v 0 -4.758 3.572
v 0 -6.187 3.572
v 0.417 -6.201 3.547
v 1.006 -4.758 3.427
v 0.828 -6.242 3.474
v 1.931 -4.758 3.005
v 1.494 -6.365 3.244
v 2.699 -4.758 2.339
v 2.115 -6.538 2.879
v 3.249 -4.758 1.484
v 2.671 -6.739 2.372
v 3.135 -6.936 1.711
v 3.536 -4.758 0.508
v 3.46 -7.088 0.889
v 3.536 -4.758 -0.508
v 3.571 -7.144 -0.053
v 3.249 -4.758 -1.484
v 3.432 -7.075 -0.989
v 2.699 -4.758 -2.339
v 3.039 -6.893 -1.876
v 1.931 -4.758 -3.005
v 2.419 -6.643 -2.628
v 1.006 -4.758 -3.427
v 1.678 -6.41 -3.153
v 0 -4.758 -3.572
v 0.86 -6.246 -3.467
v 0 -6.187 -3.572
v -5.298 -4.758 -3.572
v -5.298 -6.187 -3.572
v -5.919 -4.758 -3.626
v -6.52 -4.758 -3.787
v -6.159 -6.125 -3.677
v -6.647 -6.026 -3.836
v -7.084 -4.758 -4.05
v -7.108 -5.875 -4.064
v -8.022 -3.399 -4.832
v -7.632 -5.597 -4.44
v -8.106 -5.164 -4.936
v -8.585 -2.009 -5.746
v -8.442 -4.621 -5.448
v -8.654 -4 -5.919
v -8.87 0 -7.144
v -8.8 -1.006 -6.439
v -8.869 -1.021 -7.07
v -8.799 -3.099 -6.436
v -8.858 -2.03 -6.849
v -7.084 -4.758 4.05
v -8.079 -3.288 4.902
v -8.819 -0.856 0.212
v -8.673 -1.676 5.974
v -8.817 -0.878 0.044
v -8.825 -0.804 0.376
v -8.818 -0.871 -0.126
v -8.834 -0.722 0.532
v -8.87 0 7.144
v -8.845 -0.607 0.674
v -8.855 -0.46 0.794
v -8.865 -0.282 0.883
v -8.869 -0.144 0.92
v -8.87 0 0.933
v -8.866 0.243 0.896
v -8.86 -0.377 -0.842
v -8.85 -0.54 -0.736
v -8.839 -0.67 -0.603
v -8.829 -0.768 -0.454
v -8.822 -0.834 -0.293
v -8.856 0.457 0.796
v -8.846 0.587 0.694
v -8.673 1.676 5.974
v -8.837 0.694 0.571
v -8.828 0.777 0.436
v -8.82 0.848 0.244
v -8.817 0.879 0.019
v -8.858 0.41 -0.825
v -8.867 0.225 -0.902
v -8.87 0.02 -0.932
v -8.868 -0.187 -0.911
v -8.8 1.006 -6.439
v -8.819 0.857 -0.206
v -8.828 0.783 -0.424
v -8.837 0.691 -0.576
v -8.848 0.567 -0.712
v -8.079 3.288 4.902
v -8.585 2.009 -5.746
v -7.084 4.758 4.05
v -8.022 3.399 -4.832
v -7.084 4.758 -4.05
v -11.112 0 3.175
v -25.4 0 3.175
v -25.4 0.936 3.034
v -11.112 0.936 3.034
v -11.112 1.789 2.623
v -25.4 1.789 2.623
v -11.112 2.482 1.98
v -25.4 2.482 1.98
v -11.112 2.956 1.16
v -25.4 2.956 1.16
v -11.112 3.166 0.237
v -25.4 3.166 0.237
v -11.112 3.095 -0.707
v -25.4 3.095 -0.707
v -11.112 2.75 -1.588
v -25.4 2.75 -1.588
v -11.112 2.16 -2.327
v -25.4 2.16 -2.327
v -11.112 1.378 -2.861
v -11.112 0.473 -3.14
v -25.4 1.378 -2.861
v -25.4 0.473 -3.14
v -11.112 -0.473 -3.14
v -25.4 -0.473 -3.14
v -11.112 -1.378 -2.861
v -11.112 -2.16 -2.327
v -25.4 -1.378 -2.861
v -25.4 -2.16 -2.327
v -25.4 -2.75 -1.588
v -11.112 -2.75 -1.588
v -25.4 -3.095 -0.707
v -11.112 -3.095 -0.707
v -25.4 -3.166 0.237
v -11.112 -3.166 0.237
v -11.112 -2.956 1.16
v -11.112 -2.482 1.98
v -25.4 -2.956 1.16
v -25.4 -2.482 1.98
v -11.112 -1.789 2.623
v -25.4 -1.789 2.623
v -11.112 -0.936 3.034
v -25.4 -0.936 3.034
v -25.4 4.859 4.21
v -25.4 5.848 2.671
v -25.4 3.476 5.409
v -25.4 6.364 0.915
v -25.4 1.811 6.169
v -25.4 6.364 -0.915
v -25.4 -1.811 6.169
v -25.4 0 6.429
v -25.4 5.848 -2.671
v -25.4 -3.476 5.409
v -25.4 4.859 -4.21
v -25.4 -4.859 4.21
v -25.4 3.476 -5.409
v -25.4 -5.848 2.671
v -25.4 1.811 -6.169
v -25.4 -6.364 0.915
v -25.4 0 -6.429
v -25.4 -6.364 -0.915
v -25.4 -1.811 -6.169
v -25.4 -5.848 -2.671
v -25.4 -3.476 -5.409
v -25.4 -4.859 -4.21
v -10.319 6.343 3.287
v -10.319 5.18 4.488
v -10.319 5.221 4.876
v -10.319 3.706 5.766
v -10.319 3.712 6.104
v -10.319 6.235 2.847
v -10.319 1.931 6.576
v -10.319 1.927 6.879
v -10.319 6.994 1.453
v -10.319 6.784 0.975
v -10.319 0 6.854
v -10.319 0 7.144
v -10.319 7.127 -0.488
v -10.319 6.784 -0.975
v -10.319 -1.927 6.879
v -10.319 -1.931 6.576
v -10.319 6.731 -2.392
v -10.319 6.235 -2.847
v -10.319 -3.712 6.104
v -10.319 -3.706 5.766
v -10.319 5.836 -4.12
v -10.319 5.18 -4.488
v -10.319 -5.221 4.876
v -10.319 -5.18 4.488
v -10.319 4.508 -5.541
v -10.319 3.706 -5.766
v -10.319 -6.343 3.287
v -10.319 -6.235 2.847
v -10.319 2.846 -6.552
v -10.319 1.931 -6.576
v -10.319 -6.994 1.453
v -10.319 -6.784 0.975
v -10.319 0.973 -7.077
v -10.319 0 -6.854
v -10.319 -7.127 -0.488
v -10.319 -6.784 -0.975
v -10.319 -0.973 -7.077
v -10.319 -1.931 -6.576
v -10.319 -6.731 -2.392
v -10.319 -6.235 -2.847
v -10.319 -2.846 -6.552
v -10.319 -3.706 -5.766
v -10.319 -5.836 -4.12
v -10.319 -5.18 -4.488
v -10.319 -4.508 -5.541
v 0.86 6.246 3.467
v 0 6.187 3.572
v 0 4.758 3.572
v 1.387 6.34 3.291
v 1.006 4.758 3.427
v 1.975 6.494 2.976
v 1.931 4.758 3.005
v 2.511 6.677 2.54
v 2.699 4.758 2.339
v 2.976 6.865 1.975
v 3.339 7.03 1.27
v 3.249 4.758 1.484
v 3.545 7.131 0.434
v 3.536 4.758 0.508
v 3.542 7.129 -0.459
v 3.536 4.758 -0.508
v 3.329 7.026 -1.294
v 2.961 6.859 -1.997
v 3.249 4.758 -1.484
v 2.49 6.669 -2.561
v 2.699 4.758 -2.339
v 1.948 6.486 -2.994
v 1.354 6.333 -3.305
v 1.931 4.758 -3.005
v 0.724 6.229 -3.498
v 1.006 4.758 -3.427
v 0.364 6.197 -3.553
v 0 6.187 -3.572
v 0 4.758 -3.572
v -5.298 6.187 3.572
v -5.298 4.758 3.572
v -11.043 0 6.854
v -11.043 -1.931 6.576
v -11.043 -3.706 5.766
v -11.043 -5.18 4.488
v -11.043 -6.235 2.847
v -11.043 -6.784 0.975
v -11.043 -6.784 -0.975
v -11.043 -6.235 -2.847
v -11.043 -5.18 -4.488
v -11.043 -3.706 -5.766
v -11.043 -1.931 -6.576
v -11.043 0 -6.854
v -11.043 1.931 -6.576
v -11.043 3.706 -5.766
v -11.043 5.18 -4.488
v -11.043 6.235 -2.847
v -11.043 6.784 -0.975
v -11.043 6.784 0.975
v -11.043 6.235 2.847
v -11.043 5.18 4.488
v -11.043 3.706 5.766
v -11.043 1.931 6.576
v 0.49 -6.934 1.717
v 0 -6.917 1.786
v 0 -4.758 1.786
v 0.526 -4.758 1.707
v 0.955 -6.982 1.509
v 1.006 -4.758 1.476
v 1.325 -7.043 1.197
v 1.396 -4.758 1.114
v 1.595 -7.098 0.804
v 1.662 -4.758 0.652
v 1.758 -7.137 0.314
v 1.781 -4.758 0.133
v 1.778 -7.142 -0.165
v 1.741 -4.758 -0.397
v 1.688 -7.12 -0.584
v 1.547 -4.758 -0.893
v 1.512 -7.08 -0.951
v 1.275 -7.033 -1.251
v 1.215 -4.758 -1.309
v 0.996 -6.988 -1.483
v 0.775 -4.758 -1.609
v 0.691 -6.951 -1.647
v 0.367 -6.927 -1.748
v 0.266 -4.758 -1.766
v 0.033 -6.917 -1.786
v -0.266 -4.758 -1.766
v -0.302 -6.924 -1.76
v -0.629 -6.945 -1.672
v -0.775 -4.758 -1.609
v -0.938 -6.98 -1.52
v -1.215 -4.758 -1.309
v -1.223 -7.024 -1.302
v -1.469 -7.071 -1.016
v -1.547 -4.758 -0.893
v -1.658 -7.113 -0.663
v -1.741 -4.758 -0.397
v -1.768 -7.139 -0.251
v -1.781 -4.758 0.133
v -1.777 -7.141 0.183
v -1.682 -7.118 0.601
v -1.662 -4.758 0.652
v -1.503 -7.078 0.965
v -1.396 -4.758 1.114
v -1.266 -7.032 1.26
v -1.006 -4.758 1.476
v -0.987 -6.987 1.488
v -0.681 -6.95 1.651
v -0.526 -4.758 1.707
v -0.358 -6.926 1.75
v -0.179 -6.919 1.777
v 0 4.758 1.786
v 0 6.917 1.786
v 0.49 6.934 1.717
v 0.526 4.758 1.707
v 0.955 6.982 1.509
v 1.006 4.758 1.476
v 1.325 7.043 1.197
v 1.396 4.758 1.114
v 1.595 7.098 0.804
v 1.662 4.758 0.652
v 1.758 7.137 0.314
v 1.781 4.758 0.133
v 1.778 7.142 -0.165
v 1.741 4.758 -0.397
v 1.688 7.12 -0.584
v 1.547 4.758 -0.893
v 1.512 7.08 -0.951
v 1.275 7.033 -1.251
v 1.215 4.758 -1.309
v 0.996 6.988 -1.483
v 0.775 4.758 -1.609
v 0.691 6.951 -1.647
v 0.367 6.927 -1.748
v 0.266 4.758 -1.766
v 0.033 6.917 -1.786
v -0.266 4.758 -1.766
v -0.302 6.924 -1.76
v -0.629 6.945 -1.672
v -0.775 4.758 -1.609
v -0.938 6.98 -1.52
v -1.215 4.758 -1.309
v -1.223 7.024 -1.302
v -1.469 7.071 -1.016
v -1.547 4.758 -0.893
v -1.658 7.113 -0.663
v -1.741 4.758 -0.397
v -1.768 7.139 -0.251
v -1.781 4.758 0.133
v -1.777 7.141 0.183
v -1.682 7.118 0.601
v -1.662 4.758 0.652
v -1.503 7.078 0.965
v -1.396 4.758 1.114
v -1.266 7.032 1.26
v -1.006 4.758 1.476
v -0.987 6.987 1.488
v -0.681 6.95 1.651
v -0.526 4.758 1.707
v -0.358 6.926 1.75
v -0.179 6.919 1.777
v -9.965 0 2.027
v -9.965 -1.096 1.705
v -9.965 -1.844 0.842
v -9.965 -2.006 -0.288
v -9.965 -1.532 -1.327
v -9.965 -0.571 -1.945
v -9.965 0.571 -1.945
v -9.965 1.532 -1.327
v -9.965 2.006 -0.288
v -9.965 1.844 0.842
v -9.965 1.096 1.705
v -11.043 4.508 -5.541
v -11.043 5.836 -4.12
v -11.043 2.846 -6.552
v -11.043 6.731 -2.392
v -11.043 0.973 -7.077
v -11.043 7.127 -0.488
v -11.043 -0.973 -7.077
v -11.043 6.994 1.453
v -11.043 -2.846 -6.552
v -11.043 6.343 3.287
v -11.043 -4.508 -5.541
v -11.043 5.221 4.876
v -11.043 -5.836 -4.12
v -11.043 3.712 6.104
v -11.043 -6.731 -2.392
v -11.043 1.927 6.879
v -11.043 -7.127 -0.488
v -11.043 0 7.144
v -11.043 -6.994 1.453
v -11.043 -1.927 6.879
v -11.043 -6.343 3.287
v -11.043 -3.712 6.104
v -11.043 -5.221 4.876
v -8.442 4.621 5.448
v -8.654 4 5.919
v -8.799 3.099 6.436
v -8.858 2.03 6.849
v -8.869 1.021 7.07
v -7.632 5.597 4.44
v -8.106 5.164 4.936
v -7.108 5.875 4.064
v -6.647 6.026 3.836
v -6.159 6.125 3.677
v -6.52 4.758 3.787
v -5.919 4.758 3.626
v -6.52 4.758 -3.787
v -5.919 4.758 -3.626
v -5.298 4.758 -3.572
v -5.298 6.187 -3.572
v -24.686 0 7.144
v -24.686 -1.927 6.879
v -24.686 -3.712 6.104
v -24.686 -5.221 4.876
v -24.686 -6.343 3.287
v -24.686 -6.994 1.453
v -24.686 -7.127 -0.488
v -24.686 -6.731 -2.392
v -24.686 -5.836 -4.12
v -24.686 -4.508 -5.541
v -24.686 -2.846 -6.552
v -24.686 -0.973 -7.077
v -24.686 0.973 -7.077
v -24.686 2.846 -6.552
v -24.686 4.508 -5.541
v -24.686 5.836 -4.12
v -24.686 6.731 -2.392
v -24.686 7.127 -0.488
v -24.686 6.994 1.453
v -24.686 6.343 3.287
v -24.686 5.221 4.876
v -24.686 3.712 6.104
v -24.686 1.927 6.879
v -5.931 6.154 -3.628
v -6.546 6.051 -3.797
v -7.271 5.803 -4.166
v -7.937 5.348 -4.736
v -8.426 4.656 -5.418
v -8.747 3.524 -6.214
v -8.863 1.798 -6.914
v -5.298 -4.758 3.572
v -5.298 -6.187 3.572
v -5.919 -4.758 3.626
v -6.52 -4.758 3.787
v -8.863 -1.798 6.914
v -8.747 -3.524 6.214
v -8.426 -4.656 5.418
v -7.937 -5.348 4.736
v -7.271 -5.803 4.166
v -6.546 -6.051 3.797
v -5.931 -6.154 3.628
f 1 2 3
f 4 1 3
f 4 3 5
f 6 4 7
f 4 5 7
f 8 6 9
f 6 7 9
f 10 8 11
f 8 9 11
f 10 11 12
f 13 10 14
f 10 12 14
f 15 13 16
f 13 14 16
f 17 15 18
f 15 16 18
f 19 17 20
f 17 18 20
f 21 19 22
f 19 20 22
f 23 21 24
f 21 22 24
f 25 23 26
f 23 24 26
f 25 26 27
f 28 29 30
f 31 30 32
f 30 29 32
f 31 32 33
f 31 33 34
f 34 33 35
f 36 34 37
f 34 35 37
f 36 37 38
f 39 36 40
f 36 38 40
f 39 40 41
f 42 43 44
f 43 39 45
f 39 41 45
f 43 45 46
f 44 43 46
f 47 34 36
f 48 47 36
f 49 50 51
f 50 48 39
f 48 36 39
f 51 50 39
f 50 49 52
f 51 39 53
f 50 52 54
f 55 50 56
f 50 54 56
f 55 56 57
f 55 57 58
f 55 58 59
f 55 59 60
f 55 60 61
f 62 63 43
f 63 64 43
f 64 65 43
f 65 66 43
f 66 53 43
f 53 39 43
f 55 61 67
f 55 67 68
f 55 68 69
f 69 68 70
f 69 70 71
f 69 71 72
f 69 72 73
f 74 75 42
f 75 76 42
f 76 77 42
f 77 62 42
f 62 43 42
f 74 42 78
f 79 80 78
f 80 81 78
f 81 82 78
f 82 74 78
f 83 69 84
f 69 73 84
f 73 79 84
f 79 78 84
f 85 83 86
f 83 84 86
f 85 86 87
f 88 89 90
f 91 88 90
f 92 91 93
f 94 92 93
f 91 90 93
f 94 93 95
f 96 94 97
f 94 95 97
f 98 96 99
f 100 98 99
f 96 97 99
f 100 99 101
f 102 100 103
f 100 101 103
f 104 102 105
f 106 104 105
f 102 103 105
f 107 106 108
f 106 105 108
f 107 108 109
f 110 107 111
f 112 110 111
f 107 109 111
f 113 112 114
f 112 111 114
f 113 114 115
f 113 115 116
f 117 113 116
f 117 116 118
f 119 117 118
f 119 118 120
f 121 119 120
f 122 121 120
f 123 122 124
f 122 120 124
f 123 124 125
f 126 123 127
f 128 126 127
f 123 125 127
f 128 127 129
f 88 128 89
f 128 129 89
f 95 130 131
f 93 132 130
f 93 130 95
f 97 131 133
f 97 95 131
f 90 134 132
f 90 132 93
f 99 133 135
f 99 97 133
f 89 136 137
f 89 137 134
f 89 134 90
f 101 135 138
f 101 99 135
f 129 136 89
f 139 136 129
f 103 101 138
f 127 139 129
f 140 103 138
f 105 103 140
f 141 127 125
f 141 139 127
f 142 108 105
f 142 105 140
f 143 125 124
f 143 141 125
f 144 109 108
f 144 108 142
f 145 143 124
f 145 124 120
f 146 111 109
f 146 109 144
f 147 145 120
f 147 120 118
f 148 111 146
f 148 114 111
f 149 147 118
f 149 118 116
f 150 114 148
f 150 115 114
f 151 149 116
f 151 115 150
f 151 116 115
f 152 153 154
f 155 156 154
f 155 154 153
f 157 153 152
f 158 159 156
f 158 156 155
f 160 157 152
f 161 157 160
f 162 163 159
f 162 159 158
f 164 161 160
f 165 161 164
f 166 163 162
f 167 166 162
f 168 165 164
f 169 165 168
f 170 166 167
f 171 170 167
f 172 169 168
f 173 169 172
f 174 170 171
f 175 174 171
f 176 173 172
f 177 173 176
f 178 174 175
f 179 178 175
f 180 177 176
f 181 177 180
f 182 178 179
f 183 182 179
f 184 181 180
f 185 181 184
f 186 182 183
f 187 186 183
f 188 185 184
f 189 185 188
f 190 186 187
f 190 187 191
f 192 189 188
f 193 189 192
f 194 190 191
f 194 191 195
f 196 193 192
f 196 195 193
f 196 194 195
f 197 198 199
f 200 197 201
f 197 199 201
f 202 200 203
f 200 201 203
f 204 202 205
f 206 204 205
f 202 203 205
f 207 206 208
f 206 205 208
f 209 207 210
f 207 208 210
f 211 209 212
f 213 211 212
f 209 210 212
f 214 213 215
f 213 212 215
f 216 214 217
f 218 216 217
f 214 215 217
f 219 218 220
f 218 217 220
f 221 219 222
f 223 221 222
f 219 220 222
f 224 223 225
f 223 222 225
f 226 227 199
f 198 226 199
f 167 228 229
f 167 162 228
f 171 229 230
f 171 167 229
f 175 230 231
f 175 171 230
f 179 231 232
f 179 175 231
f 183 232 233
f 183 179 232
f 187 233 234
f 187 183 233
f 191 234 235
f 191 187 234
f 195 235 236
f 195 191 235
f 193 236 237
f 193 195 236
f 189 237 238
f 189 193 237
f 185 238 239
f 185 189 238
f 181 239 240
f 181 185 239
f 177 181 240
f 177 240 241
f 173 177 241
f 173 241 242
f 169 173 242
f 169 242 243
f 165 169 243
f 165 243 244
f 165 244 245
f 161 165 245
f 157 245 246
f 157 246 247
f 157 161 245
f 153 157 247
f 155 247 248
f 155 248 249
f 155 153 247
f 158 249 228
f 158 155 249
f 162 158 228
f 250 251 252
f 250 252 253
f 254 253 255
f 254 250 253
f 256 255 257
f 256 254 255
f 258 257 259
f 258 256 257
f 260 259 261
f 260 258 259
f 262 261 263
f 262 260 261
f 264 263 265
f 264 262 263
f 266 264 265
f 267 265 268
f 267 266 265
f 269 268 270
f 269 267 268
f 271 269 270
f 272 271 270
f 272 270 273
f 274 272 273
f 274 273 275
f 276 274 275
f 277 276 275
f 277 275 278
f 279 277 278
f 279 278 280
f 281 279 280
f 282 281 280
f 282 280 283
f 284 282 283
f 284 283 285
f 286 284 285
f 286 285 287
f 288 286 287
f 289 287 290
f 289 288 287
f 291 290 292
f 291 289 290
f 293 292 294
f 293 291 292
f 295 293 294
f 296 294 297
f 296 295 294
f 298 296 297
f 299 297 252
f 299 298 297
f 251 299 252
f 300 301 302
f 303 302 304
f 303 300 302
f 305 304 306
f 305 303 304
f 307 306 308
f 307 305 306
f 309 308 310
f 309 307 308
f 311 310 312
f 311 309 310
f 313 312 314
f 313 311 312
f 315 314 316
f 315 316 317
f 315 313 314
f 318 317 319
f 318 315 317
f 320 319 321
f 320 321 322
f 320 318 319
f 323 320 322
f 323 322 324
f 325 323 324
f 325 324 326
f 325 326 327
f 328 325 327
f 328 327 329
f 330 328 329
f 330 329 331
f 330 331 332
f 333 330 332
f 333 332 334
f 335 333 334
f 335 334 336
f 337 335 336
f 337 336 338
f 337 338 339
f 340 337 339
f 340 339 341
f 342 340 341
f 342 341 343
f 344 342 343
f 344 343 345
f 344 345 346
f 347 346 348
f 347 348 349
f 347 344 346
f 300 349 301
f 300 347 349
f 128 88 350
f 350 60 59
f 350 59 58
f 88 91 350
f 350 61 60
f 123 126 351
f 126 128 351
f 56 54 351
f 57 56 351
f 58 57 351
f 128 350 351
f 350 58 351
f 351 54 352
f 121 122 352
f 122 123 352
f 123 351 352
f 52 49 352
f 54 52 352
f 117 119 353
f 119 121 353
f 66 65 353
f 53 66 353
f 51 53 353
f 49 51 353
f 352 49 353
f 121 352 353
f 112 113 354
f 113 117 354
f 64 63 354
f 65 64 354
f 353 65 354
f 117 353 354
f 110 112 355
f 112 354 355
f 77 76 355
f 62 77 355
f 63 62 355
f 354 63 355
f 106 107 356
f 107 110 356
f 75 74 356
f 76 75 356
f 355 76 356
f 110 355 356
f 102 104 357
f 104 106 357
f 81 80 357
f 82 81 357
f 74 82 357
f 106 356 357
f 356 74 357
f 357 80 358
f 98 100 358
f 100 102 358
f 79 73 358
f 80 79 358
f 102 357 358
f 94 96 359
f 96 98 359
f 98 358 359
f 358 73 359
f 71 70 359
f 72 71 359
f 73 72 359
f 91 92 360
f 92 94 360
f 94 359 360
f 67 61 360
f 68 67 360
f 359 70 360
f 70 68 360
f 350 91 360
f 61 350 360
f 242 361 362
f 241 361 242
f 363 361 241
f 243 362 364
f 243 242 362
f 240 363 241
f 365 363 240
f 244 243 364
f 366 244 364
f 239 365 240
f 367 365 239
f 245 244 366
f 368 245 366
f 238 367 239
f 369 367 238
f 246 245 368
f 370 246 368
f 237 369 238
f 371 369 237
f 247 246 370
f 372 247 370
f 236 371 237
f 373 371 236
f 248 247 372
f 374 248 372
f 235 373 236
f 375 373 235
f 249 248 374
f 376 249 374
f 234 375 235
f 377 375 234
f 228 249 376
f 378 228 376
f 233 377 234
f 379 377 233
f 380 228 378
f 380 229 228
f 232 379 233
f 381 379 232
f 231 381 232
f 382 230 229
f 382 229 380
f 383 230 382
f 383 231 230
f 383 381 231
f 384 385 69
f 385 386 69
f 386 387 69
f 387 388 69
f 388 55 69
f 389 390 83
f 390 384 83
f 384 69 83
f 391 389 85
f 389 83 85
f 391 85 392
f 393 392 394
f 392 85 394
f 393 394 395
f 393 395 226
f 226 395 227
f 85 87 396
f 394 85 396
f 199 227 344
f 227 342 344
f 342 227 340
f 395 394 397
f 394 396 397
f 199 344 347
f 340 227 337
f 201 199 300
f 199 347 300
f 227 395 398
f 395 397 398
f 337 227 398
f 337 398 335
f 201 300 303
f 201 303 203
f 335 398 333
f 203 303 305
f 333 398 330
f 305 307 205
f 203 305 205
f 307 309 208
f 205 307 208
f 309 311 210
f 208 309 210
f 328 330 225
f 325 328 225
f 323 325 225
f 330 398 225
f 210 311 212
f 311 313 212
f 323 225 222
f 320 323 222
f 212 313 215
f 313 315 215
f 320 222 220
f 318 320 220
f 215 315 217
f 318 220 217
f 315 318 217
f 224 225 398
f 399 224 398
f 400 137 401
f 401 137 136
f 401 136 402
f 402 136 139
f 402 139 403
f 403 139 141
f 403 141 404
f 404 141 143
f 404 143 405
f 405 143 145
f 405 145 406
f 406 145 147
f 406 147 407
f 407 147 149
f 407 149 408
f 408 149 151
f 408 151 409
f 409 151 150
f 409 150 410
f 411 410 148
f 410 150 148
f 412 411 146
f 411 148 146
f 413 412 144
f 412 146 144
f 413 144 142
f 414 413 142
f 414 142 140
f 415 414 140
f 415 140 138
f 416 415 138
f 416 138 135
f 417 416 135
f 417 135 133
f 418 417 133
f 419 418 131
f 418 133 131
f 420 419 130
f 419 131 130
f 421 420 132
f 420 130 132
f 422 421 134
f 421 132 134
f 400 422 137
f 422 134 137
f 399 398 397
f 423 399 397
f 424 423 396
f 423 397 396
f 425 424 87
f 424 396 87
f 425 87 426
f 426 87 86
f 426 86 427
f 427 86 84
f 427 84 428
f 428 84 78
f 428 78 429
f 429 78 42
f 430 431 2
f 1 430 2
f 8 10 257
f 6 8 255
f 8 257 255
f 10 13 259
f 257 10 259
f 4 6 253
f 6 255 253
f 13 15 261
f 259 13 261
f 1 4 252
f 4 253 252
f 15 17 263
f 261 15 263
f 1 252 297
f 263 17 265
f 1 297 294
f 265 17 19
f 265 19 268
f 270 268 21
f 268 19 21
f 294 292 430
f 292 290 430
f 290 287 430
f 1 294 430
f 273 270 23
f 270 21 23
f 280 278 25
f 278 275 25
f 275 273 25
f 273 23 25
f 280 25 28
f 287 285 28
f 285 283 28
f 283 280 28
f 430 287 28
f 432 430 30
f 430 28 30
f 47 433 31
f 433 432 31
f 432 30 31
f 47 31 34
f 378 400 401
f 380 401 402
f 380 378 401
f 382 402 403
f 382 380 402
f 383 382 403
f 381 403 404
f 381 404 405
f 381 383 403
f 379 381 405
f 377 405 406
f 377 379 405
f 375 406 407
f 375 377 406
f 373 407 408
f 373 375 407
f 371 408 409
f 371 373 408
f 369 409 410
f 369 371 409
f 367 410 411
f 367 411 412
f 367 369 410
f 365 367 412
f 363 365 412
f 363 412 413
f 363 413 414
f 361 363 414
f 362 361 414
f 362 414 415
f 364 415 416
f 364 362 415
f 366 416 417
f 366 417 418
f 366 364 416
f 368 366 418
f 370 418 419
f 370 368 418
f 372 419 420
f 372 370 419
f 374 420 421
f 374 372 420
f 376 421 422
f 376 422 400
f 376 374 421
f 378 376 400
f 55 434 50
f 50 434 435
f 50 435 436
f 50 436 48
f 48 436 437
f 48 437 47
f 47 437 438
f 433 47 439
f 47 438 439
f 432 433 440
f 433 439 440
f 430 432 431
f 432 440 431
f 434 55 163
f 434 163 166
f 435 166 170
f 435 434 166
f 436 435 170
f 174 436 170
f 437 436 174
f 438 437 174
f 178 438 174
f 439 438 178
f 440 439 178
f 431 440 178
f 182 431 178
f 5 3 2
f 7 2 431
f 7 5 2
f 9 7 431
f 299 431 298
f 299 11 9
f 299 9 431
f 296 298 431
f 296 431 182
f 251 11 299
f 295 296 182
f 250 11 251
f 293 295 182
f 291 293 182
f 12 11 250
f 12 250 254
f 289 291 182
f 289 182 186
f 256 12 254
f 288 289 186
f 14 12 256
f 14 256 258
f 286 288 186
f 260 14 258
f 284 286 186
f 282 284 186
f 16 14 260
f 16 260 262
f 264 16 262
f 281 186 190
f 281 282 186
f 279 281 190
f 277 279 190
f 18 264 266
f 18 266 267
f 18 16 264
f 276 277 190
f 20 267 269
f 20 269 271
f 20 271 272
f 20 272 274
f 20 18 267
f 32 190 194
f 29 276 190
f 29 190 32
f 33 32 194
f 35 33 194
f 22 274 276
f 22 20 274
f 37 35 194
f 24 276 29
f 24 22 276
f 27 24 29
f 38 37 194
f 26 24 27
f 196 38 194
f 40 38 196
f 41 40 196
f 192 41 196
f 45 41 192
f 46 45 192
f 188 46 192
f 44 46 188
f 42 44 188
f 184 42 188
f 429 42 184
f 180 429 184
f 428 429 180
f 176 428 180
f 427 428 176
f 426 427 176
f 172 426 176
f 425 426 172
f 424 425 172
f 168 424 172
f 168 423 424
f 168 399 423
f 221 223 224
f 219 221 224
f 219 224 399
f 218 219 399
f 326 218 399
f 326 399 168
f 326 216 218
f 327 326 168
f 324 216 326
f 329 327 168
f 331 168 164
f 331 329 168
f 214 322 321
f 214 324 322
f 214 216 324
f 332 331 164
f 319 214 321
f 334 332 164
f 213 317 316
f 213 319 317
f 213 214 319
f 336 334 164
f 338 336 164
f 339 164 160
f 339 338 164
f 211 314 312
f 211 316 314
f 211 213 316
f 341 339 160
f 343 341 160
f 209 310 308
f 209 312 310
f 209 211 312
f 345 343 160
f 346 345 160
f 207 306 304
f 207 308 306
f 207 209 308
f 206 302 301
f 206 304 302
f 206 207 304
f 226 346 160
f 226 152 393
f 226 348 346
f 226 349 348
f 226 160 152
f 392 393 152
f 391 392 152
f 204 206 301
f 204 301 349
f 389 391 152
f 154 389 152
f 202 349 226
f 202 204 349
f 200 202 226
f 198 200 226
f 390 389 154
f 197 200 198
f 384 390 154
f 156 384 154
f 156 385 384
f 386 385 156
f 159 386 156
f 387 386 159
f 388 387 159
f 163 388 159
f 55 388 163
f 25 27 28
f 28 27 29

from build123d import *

# Parameters (mm, degrees)
CHAMFER1_SIZE       = 0.714375
EXTRUDE1_DEPTH      = 28.33544088
EXTRUDE1_DEPTH_BACK = 28.33544088
EXTRUDE3_DEPTH      = 28.335440933
EXTRUDE3_DEPTH_BACK = 28.335440933
SKETCH4_R           = 3.175
EXTRUDE4_DEPTH      = 14.2875
EXTRUDE6_DEPTH      = 28.335440933
EXTRUDE6_DEPTH_BACK = 28.335440933
SKETCH6_R           = 1.7859375


with BuildPart() as part:
    # Sketch1 → Revolve1 (revolve)
    with BuildSketch(Plane(origin=(0, 0, 0), x_dir=(1, 0, 0), z_dir=(0, 1, 0)), mode=Mode.PRIVATE) as revolve1_sk:
        Polygon((-25.4, 7.14375), (-11.043046875, 7.14375), (-11.043046875, 6.85403125), (-10.31875, 6.85403125), (-10.31875, 7.14375), (3.571875, 7.14375), (3.571875, 0), (-25.4, 0), align=None)
    revolve(revolve1_sk.sketch.rotate(Axis((-25.4, 0, 0), (1, 0, 0)), 180), axis=Axis((-25.4, 0, 0), (1, 0, 0)))

    # Chamfer1
    chamfer1_edges = [part.edges().sort_by_distance(p)[0] for p in [
        (-25.4, 0, -7.14375),
    ]]
    chamfer(chamfer1_edges, length=CHAMFER1_SIZE)

    # Sketch2 → Extrude1 (cut, two sides: drawn at the far end of the back side and taken through both)
    with BuildSketch(Plane(origin=(0, 0, 0), x_dir=(1, 0, 0), z_dir=(0, 1, 0)).offset(-EXTRUDE1_DEPTH_BACK)):
        with BuildLine():
            Line((-8.87015625, 7.14375), (7.14375, 7.14375))
            Line((7.14375, 7.14375), (7.14375, -7.14375))
            Line((7.14375, -7.14375), (-8.87015625, -7.14375))
            ThreePointArc((-8.87015625, -7.14375), (-7.823978284, -4.618052966), (-5.29828125, -3.571875))
            Line((-5.29828125, -3.571875), (0, -3.571875))
            ThreePointArc((0, -3.571875), (3.571875, 0), (0, 3.571875))
            Line((0, 3.571875), (-5.29828125, 3.571875))
            ThreePointArc((-5.29828125, 3.571875), (-7.823978284, 4.618052966), (-8.87015625, 7.14375))
        make_face()
    extrude(amount=EXTRUDE1_DEPTH + EXTRUDE1_DEPTH_BACK, mode=Mode.SUBTRACT)

    # Sketch3 → Extrude3 (cut, two sides: drawn at the far end of the back side and taken through both)
    with BuildSketch(Plane.XY.offset(-EXTRUDE3_DEPTH_BACK)):
        with BuildLine():
            Line((-7.08421875, 4.7577375), (7.14375, 4.7577375))
            Line((7.14375, 4.7577375), (7.14375, -4.7577375))
            Line((7.14375, -4.7577375), (-7.08421875, -4.7577375))
            ThreePointArc((-7.08421875, -4.7577375), (-8.87015625, 0), (-7.08421875, 4.7577375))
        make_face()
    extrude(amount=EXTRUDE3_DEPTH + EXTRUDE3_DEPTH_BACK, mode=Mode.SUBTRACT)

    # Sketch4 → Extrude4 (cut)
    with BuildSketch(Plane.ZY.offset(25.4)):
        Circle(SKETCH4_R)
    extrude(amount=-EXTRUDE4_DEPTH, mode=Mode.SUBTRACT)

    # Extrude5 cone 1 section (through the dimple's axis) → Extrude5 (revolve, cut)
    with BuildSketch(Plane(origin=(-11.1125, 0, 0), x_dir=(0, 0, 1), z_dir=(0, 1, 0))):
        Polygon((0, 0), (3.175, 0), (0, 3.175), align=None)
    revolve(axis=Axis((-11.1125, 0, 0), (1, 0, 0)), mode=Mode.SUBTRACT)

    # Sketch6 → Extrude6 (cut, two sides: drawn at the far end of the back side and taken through both)
    with BuildSketch(Plane(origin=(0, 0, 0), x_dir=(1, 0, 0), z_dir=(0, 1, 0)).offset(-EXTRUDE6_DEPTH_BACK)):
        with Locations(Location((0, 0, 0), (0, 0, 270))):
            Circle(SKETCH6_R)
    extrude(amount=EXTRUDE6_DEPTH + EXTRUDE6_DEPTH_BACK, mode=Mode.SUBTRACT)


solid = part.part
